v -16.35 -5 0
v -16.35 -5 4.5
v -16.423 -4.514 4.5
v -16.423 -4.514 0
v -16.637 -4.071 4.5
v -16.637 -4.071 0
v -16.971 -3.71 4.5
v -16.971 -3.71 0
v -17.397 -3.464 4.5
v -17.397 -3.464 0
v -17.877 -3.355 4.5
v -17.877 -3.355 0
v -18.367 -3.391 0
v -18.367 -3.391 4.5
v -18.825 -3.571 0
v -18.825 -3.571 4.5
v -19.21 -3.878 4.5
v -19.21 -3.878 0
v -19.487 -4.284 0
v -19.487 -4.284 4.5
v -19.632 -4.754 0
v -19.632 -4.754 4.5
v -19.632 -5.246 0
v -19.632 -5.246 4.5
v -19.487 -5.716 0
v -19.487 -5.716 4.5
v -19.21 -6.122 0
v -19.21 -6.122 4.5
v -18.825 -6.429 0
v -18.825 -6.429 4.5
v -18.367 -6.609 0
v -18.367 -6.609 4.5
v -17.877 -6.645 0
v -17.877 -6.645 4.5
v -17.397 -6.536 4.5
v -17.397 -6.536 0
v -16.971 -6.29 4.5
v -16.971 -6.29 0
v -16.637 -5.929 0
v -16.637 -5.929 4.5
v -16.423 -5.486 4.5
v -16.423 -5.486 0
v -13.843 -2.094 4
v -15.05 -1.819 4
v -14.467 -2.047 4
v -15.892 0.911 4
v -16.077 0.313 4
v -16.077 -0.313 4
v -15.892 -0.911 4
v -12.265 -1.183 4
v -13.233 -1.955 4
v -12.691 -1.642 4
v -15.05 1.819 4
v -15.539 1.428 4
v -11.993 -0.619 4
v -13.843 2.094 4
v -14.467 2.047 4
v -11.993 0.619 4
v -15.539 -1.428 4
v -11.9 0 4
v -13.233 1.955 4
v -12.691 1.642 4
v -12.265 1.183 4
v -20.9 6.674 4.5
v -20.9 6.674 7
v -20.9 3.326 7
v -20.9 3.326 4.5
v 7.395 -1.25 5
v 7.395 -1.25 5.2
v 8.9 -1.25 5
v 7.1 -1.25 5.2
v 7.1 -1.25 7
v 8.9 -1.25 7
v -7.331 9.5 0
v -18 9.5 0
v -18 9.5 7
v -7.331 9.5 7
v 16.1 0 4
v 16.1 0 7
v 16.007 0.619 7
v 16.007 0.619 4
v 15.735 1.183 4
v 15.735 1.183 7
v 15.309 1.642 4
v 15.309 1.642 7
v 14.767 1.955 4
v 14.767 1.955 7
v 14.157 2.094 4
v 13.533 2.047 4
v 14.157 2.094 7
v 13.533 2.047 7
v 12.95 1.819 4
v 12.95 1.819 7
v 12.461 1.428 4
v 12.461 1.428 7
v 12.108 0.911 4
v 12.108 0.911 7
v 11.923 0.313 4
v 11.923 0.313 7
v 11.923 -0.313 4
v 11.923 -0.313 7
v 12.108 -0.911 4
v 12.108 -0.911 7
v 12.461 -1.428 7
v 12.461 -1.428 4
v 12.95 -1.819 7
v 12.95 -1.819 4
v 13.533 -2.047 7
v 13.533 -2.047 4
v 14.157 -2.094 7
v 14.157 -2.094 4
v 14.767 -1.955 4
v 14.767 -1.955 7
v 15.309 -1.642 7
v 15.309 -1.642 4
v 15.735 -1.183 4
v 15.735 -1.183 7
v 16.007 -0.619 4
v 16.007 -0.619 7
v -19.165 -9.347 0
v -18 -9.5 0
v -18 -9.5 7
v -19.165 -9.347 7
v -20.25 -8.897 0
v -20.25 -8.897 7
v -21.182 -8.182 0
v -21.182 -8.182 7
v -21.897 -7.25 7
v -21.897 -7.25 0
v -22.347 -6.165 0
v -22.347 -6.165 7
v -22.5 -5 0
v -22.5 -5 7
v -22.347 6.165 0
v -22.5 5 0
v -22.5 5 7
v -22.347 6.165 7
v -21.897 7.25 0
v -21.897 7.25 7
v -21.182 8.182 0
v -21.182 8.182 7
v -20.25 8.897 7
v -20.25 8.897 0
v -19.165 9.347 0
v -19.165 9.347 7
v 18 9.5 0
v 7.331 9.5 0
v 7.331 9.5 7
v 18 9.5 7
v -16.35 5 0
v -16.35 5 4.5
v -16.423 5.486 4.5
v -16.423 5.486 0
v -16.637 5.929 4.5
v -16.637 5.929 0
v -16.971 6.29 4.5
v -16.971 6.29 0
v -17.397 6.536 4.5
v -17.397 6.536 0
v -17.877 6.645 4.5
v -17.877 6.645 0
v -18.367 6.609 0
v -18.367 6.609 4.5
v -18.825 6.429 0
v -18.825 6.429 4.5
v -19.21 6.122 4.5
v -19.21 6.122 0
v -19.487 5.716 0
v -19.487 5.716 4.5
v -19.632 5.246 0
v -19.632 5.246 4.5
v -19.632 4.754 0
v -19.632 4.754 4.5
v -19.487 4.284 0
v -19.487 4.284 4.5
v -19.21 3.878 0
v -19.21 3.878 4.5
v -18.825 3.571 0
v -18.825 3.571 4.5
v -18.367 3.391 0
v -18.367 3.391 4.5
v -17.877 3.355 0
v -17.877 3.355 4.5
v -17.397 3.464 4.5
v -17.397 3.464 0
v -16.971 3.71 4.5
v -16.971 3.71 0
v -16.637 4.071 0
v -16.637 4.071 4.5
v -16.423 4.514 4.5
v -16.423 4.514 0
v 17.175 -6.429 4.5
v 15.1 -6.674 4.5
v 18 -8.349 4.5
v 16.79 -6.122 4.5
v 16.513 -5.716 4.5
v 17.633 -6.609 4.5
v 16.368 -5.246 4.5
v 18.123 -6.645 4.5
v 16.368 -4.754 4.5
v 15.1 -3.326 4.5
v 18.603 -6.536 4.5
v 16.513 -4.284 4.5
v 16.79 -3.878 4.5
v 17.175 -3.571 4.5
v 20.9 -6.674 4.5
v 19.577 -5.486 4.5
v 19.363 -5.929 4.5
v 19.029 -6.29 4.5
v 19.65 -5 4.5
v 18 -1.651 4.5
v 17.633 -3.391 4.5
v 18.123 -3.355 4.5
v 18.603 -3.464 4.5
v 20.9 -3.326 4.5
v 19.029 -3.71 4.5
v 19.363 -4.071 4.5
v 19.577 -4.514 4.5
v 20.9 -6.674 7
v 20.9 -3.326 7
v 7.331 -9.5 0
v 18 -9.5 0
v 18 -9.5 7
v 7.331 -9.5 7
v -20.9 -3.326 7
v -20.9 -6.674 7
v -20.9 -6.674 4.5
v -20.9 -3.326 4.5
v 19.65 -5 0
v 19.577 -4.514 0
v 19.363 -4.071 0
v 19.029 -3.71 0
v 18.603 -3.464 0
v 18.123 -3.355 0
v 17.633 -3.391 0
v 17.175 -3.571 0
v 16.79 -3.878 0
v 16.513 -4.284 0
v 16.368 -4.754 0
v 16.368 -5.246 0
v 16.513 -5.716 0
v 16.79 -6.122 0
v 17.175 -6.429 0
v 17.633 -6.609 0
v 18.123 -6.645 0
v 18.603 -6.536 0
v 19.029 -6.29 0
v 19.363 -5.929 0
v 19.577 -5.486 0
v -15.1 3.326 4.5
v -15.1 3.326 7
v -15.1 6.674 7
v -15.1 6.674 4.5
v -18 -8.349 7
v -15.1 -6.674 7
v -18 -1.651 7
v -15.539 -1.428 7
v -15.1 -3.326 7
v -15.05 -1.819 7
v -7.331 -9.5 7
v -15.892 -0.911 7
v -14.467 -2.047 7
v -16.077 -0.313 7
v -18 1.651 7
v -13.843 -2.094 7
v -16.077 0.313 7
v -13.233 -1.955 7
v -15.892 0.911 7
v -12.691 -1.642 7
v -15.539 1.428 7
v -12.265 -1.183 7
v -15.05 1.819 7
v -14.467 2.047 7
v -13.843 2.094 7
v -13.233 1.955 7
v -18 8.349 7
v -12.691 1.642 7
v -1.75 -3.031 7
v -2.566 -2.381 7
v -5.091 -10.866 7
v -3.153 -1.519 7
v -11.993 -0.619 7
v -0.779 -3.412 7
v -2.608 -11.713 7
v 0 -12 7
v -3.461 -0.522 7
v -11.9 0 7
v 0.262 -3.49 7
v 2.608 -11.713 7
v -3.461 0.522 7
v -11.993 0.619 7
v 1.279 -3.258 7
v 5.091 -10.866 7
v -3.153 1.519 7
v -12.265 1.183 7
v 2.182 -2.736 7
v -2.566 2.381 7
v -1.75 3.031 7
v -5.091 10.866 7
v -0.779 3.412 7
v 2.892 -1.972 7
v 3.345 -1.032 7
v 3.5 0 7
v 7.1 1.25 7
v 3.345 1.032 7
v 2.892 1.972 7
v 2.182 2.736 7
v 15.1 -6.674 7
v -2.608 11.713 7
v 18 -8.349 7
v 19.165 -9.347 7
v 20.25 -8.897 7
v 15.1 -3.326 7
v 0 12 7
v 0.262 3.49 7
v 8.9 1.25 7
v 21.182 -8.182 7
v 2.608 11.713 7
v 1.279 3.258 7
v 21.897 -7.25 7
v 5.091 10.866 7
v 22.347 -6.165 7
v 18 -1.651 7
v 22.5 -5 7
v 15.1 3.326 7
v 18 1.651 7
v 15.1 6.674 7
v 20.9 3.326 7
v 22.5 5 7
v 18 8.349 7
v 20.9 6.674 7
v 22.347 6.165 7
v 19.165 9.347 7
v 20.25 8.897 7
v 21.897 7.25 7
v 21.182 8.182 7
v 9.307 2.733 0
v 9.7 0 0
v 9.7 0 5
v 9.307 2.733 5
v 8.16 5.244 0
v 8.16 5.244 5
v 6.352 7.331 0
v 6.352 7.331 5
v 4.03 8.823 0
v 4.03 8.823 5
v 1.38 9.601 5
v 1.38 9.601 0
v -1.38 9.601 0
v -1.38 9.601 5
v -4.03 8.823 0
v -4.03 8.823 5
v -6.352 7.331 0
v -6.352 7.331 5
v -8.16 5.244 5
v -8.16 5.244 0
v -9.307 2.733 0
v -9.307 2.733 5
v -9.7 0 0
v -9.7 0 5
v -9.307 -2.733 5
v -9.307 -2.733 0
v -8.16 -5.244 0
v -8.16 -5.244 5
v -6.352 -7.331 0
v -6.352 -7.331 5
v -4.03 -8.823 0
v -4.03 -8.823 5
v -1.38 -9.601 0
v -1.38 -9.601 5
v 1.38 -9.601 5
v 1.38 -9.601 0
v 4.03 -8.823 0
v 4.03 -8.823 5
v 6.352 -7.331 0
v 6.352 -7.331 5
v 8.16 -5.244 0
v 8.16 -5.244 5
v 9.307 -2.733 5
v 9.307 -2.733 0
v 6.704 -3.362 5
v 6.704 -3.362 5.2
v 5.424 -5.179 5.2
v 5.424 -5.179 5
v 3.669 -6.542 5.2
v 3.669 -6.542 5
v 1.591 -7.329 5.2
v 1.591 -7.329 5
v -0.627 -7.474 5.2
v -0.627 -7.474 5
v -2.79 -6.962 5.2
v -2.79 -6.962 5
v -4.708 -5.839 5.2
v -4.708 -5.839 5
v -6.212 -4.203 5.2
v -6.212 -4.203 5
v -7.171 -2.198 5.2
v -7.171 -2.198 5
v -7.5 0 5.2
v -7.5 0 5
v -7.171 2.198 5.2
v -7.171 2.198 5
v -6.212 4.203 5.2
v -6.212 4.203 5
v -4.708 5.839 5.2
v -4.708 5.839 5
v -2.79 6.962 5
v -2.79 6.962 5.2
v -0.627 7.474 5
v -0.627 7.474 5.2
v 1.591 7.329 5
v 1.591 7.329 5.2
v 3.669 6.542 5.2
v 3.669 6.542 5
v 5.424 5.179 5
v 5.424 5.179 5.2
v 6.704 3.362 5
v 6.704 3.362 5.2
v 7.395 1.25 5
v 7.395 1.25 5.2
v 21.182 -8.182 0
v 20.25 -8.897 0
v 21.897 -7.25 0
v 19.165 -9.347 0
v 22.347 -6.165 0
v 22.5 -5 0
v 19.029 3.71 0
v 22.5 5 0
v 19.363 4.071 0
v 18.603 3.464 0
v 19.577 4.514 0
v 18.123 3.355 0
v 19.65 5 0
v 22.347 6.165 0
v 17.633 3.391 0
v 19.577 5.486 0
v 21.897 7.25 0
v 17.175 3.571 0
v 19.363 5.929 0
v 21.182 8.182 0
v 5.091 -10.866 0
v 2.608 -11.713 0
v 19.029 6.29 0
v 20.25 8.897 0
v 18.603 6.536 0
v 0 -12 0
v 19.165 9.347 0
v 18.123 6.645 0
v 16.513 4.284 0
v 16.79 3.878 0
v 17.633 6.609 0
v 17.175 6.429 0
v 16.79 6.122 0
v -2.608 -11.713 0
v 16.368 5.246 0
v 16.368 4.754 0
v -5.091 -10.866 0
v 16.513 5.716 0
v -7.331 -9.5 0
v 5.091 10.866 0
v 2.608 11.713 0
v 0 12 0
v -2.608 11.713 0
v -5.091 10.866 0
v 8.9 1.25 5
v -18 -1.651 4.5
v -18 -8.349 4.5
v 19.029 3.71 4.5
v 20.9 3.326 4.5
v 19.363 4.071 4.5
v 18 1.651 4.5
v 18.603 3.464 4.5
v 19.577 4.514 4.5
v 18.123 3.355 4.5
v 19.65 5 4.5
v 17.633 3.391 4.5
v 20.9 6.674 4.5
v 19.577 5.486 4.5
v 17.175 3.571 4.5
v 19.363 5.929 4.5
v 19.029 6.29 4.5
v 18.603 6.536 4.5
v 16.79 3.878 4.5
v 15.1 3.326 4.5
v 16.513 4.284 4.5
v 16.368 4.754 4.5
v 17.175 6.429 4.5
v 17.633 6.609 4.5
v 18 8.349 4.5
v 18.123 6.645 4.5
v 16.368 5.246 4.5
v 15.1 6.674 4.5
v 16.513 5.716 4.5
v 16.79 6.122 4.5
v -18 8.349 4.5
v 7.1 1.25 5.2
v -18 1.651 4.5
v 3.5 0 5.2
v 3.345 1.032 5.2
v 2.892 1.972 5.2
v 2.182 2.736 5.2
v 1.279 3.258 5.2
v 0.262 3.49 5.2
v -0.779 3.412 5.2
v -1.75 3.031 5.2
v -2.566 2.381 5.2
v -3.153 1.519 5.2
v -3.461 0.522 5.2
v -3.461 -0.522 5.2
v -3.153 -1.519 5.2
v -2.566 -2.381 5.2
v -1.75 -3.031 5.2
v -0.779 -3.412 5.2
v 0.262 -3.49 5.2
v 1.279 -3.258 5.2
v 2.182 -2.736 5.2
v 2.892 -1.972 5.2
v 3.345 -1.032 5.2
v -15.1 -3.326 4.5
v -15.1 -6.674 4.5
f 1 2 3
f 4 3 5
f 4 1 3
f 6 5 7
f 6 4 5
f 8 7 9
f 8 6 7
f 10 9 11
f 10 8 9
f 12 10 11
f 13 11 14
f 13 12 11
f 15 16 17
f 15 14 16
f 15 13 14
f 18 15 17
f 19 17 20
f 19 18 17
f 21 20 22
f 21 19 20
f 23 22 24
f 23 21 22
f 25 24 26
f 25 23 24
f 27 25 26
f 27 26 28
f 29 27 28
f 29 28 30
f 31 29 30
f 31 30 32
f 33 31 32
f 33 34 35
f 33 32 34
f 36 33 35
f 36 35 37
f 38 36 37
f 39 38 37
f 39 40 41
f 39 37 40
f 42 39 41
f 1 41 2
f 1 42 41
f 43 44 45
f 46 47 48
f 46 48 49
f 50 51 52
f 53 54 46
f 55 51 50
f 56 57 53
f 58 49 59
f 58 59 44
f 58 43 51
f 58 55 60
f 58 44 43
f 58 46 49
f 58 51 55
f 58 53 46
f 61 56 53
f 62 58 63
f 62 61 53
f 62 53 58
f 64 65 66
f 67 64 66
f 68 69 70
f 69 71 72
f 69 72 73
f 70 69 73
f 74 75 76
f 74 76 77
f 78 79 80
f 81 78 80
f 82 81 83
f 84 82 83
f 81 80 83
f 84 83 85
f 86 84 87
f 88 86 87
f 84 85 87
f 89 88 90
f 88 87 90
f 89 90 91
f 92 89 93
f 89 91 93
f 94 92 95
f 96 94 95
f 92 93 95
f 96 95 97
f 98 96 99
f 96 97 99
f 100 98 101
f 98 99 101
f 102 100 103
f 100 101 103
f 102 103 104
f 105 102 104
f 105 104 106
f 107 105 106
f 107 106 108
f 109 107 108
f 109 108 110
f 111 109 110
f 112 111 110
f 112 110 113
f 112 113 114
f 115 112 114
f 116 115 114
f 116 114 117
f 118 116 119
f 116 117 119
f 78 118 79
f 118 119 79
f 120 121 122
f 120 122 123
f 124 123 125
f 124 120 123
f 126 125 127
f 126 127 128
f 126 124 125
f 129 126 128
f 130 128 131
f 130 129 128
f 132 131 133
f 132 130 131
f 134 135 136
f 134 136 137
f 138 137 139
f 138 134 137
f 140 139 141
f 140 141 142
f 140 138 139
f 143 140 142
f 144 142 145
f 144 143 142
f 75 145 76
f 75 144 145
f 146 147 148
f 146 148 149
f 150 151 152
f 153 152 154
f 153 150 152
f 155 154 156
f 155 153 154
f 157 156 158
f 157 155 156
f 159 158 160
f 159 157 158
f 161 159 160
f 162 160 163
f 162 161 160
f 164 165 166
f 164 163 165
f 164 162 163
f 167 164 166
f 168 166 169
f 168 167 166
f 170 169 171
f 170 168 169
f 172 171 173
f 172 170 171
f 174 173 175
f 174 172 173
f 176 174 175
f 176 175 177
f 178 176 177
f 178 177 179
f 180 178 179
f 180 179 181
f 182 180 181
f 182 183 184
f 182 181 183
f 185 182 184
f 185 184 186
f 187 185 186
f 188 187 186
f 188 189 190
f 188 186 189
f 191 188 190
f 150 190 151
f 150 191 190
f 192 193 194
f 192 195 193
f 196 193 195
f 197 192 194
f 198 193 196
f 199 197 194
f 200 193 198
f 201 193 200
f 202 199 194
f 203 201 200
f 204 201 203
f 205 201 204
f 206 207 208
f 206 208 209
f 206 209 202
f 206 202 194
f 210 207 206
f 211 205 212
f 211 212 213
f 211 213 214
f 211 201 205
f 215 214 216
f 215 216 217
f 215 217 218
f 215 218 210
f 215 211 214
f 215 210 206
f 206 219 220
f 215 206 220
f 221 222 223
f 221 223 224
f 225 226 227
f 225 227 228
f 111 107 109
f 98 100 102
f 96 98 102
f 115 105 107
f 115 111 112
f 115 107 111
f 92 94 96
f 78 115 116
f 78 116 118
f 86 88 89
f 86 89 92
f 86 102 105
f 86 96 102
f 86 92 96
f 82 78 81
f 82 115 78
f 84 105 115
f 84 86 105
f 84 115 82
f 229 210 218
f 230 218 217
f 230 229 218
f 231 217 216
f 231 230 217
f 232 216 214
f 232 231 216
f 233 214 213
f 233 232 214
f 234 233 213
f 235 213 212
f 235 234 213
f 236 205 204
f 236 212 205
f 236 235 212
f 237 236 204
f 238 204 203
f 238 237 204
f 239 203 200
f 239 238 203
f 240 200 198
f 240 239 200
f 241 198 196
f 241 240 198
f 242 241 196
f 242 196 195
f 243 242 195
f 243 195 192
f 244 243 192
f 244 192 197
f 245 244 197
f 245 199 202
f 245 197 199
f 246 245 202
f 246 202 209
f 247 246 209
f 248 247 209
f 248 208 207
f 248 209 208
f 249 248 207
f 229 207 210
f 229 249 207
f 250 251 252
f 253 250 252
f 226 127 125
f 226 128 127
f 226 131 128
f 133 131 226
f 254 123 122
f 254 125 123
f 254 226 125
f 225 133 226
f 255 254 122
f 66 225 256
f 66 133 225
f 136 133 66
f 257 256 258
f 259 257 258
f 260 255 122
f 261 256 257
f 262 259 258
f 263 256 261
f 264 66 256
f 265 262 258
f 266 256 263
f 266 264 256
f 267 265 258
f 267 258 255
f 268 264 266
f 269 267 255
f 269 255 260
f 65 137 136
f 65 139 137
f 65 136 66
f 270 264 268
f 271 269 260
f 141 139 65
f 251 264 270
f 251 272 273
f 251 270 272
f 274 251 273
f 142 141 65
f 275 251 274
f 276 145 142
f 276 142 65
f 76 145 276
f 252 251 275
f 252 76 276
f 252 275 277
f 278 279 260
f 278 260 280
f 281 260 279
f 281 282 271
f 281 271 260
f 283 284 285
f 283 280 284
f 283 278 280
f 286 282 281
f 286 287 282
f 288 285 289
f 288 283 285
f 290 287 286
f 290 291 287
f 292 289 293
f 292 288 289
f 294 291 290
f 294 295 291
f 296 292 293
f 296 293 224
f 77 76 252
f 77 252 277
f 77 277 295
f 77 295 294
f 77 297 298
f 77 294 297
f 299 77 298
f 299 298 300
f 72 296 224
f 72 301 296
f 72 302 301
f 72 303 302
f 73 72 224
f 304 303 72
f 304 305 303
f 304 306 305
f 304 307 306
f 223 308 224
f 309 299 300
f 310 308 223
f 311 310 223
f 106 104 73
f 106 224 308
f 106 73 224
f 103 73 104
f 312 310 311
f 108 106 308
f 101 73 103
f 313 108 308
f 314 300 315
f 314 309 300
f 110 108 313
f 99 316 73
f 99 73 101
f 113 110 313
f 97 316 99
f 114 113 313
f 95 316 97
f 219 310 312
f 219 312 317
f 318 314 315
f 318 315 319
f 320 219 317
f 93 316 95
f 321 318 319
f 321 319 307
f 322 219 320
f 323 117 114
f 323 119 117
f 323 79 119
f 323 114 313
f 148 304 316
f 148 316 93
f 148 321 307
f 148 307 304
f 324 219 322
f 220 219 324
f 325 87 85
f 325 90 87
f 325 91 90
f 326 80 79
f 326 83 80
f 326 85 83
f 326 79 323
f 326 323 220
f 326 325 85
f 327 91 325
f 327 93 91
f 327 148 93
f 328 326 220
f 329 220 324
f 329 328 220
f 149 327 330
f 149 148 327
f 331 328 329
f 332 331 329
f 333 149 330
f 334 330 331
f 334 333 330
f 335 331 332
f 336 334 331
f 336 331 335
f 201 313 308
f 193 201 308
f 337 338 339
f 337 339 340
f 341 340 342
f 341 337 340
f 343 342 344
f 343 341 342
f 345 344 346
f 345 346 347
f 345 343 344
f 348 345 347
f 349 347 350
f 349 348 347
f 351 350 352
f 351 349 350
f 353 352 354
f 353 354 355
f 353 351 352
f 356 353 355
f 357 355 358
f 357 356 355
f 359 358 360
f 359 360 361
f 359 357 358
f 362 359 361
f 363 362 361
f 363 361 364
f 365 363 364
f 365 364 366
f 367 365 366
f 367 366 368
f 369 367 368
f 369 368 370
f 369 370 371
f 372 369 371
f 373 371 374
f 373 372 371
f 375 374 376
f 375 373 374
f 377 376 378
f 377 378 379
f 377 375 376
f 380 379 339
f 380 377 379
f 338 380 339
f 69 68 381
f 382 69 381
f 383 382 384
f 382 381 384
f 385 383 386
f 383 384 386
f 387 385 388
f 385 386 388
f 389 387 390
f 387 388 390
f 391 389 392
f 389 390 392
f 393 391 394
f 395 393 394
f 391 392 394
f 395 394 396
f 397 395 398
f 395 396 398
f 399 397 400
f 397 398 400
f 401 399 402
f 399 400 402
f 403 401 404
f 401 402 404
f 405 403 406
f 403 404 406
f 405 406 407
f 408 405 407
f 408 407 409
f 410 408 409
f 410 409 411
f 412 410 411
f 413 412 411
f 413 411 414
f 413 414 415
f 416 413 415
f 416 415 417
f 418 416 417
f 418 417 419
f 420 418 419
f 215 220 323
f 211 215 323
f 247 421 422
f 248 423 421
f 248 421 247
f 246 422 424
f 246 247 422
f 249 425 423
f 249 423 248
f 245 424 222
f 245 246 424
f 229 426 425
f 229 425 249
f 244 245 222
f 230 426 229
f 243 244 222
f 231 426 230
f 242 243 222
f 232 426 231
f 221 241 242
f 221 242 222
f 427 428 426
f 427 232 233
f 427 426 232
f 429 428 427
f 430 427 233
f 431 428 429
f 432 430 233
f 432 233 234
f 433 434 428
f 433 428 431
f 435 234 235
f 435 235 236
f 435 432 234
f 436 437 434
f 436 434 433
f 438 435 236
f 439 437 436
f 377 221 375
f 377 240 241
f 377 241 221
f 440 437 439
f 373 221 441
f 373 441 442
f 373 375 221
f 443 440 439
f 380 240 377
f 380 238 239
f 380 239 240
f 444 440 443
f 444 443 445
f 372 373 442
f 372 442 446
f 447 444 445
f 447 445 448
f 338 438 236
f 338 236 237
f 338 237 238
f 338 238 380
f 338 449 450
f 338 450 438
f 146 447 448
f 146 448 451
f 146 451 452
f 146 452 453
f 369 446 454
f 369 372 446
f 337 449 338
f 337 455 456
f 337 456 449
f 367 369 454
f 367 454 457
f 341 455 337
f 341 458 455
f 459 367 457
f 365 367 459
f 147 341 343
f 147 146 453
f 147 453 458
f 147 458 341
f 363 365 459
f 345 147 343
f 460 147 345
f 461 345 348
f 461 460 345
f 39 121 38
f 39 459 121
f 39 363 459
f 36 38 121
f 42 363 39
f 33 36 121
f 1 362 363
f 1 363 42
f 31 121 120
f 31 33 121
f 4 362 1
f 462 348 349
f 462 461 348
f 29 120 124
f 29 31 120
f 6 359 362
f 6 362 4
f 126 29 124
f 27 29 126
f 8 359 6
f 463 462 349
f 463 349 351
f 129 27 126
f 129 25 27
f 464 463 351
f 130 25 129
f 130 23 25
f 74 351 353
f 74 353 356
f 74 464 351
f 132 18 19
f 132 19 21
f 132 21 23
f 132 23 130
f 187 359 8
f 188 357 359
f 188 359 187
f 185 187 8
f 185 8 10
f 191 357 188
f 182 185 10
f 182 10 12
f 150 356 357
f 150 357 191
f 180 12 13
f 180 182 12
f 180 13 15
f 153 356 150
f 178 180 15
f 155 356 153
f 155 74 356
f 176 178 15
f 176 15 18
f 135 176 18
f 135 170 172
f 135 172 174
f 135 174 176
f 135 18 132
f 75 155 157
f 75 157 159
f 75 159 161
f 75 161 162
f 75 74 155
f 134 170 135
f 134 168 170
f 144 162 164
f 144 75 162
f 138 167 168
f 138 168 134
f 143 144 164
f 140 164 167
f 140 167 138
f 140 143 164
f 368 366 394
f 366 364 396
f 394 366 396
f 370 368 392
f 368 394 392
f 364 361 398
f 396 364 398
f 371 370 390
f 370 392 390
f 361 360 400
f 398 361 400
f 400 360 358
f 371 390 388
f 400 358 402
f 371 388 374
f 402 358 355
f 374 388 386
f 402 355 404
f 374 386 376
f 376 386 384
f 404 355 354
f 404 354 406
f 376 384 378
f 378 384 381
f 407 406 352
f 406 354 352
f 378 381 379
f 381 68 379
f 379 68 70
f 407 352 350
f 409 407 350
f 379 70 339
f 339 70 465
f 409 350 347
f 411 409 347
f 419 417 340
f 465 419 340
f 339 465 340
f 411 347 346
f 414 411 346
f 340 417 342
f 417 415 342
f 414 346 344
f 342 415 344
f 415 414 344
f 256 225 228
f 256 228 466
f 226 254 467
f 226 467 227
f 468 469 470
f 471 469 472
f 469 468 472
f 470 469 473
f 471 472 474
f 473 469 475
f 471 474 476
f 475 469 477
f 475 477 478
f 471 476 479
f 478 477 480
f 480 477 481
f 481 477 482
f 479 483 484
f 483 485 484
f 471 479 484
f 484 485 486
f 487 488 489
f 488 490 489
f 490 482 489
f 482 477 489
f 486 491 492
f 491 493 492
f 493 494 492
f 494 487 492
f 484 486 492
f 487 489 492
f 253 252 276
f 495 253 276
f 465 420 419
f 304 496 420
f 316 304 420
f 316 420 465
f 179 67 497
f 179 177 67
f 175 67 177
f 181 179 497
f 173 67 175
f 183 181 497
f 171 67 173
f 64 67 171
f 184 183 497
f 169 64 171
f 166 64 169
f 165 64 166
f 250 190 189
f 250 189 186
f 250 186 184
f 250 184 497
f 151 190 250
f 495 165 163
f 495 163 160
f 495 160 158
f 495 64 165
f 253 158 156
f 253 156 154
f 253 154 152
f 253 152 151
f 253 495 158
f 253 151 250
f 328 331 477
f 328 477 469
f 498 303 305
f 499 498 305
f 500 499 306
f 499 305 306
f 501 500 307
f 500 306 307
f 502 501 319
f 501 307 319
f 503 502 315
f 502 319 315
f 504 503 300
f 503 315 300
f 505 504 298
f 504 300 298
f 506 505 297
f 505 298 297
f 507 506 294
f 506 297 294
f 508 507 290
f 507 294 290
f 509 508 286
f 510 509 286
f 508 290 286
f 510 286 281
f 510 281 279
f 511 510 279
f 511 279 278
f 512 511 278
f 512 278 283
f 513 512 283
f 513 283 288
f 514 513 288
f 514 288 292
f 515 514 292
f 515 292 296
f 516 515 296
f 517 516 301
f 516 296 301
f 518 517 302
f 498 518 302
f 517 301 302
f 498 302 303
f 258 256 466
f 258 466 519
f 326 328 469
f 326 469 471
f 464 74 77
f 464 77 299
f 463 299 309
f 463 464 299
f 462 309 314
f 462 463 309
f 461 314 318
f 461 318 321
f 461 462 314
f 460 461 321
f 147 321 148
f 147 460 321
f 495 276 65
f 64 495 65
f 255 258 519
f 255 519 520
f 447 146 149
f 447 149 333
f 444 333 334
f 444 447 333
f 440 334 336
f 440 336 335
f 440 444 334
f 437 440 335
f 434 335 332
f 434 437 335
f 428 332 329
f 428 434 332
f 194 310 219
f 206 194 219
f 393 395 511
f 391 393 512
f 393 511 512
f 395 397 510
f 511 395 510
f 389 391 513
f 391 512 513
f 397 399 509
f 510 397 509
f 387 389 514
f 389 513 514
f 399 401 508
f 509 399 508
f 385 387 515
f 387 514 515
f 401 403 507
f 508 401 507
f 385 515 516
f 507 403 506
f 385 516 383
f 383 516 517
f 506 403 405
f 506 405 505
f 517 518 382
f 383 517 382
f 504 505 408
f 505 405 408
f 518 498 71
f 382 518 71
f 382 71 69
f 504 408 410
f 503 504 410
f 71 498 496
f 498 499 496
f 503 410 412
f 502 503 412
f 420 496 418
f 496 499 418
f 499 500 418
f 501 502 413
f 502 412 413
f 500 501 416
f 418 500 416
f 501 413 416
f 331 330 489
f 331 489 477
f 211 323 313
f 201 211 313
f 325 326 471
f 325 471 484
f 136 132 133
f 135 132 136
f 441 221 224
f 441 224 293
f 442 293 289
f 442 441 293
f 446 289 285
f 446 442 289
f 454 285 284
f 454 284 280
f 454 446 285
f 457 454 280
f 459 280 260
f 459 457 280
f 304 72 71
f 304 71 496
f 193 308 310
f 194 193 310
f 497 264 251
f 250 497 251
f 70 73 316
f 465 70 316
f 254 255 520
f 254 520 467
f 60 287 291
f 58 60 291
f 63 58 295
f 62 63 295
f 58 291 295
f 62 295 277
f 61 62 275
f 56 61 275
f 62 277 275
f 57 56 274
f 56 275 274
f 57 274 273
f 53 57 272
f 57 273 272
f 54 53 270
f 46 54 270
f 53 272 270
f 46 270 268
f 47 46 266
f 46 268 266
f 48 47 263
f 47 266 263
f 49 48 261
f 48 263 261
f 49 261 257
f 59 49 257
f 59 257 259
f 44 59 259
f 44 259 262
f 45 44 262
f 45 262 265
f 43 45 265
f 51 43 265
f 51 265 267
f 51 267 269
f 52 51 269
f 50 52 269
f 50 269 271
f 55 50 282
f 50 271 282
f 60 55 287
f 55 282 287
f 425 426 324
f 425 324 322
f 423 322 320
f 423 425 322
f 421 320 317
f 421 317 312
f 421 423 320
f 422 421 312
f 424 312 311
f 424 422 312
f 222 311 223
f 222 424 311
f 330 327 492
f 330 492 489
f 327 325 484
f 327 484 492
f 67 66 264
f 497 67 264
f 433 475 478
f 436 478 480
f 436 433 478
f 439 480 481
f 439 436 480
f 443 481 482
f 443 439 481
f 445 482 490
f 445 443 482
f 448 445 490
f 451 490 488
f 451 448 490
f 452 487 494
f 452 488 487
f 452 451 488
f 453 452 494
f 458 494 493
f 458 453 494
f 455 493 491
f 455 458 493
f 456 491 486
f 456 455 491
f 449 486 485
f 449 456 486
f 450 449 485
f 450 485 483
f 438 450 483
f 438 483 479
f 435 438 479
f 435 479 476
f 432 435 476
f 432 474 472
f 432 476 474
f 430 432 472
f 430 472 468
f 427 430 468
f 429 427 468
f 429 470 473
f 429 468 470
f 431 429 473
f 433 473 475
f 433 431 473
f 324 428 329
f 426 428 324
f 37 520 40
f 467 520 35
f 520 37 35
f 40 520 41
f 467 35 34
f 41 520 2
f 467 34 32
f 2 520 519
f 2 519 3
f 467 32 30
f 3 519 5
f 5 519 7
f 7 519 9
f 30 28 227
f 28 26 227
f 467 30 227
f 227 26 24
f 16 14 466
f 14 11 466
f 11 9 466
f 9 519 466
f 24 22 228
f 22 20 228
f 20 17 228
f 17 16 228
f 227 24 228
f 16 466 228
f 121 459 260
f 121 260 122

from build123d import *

# Parameters (mm, degrees)
SKETCH2_R           = 1.65
BOSS_EXTRUDE1_DEPTH = 7
SKETCH3_R           = 9.7
CUT_EXTRUDE1_DEPTH  = 5
SKETCH4_R           = 7.5
CUT_EXTRUDE2_DEPTH  = 5
CUT_EXTRUDE3_DEPTH  = 2.5
SKETCH6_R           = 7.5
SKETCH6_R_2         = 3.5
BOSS_EXTRUDE2_DEPTH = 1.8
SKETCH7_W           = 1.8
SKETCH7_H           = 2.5
CUT_EXTRUDE4_DEPTH  = 2.5
SKETCH8_R           = 2.1
CUT_EXTRUDE5_DEPTH  = 3


with BuildPart() as part:
    # Sketch2 → Boss-Extrude1 (new body)
    with BuildSketch(Plane.XY):
        with BuildLine():
            Line((-18, 9.5), (-7.331439149, 9.5))
            ThreePointArc((-7.331439149, 9.5), (0, 12), (7.331439149, 9.5))
            Line((7.331439149, 9.5), (18, 9.5))
            ThreePointArc((18, 9.5), (21.181980515, 8.181980515), (22.5, 5))
            Line((22.5, 5), (22.5, -5))
            ThreePointArc((22.5, -5), (21.181980515, -8.181980515), (18, -9.5))
            Line((18, -9.5), (7.331439149, -9.5))
            ThreePointArc((7.331439149, -9.5), (0, -12), (-7.331439149, -9.5))
            Line((-7.331439149, -9.5), (-18, -9.5))
            ThreePointArc((-18, -9.5), (-21.181980515, -8.181980515), (-22.5, -5))
            Line((-22.5, -5), (-22.5, 5))
            ThreePointArc((-22.5, 5), (-21.181980515, 8.181980515), (-18, 9.5))
        make_face()
        with Locations((-18, 5)):
            Circle(SKETCH2_R, mode=Mode.SUBTRACT)
        with Locations((18, 5)):
            Circle(SKETCH2_R, mode=Mode.SUBTRACT)
        with Locations((18, -5)):
            Circle(SKETCH2_R, mode=Mode.SUBTRACT)
        with Locations((-18, -5)):
            Circle(SKETCH2_R, mode=Mode.SUBTRACT)
    extrude(amount=BOSS_EXTRUDE1_DEPTH)

    # Sketch3 → Cut-Extrude1 (cut)
    with BuildSketch(Plane.XY):
        Circle(SKETCH3_R)
    extrude(amount=CUT_EXTRUDE1_DEPTH, mode=Mode.SUBTRACT)

    # Sketch4 → Cut-Extrude2 (cut)
    with BuildSketch(Plane(origin=(0, 0, 5), x_dir=(-1, 0, 0), z_dir=(0, 0, -1))):
        Circle(SKETCH4_R)
    extrude(amount=-CUT_EXTRUDE2_DEPTH, mode=Mode.SUBTRACT)

    # Sketch5 → Cut-Extrude3 (cut)
    with BuildSketch(Plane.XY.offset(7)):
        Polygon((-18, 8.348631561), (-20.9, 6.674315781), (-20.9, 3.325684219), (-18, 1.651368439), (-15.1, 3.325684219), (-15.1, 6.674315781), align=None)
        Polygon((15.1, 6.674315781), (18, 8.348631561), (20.9, 6.674315781), (20.9, 3.325684219), (18, 1.651368439), (15.1, 3.325684219), align=None)
        Polygon((15.1, -3.325684219), (15.1, -6.674315781), (18, -8.348631561), (20.9, -6.674315781), (20.9, -3.325684219), (18, -1.651368439), align=None)
        Polygon((-15.1, -6.674315781), (-18, -8.348631561), (-20.9, -6.674315781), (-20.9, -3.325684219), (-18, -1.651368439), (-15.1, -3.325684219), align=None)
    extrude(amount=-CUT_EXTRUDE3_DEPTH, mode=Mode.SUBTRACT)

    # Sketch6 → Boss-Extrude2 (add)
    with BuildSketch(Plane.XY.offset(7)):
        Circle(SKETCH6_R)
        Circle(SKETCH6_R_2, mode=Mode.SUBTRACT)
    extrude(amount=-BOSS_EXTRUDE2_DEPTH)

    # Sketch7 → Cut-Extrude4 (cut)
    with BuildSketch(Plane.XY.offset(7)):
        with Locations((8, 0)):
            Rectangle(SKETCH7_W, SKETCH7_H)
    extrude(amount=-CUT_EXTRUDE4_DEPTH, mode=Mode.SUBTRACT)

    # Sketch8 → Cut-Extrude5 (cut)
    with BuildSketch(Plane.XY.offset(7)):
        with Locations((-14, 0)):
            Circle(SKETCH8_R)
        with Locations((14, 0)):
            Circle(SKETCH8_R)
    extrude(amount=-CUT_EXTRUDE5_DEPTH, mode=Mode.SUBTRACT)


solid = part.part
